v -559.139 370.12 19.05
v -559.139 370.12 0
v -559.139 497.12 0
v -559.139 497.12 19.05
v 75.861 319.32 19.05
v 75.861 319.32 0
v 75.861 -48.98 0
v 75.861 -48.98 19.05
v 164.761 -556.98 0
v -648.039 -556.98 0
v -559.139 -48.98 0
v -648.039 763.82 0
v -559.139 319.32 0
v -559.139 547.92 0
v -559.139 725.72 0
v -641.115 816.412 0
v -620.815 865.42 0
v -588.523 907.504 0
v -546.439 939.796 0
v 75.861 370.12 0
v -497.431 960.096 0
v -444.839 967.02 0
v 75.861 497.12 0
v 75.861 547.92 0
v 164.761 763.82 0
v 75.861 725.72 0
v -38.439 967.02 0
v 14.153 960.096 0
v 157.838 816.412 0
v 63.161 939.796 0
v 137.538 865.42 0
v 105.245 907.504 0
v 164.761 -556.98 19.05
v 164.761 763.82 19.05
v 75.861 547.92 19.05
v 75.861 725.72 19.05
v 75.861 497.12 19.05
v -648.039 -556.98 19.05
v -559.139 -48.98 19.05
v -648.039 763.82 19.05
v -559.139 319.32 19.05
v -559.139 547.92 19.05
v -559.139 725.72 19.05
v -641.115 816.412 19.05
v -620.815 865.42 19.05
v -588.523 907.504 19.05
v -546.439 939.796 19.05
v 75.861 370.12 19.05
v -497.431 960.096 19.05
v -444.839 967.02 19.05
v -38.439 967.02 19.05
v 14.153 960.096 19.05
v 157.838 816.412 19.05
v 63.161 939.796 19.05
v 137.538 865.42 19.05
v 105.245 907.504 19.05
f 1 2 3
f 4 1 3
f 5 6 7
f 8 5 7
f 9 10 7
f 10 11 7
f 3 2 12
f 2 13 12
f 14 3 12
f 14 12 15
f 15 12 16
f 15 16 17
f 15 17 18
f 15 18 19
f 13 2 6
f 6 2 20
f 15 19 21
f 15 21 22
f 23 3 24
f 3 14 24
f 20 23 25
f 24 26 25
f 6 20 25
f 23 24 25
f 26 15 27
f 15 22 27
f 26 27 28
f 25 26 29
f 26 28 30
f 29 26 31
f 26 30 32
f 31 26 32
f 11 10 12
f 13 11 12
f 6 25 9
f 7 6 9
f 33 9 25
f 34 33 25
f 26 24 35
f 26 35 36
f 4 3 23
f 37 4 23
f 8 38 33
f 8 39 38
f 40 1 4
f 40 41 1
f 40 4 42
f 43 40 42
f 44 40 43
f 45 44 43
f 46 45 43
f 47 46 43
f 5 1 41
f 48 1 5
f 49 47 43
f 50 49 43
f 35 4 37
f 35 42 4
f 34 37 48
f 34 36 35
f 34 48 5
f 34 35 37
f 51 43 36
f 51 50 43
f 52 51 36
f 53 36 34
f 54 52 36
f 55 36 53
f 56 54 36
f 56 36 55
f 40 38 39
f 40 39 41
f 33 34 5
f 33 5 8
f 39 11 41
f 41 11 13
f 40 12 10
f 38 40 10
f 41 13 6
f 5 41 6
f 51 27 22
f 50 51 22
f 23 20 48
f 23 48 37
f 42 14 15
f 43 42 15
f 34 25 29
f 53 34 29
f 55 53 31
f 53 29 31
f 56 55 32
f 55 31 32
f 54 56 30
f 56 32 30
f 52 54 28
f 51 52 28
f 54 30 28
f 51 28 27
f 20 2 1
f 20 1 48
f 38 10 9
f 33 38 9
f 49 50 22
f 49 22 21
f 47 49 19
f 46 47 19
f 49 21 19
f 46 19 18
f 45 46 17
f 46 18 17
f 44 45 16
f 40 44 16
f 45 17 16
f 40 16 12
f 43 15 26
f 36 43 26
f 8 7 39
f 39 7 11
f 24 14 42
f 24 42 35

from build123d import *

# Parameters (mm, degrees)
F0_W     = 635
F0_H     = 126.999991
F0_H_2   = 177.800009
F1_DEPTH = 19.05


with BuildPart() as f1:
    # F0 (on Top) → F1 (new body)
    with BuildSketch(Plane.XY):
        with BuildLine():
            Line((-648.038619, 763.81958), (-648.038619, -556.98042))
            Line((-648.038619, -556.98042), (164.761381, -556.98042))
            Line((164.761381, -556.98042), (164.761381, 763.81958))
            ThreePointArc((164.761381, 763.81958), (105.245479, 907.503678), (-38.438619, 967.01958))
            Line((-38.438619, 967.01958), (-444.838619, 967.01958))
            ThreePointArc((-444.838619, 967.01958), (-588.522717, 907.503678), (-648.038619, 763.81958))
        make_face()
        Polygon((75.861381, -48.98042), (-559.138619, -48.98042), (-559.138619, 90.71958), (-559.138619, 141.51958), (-559.138619, 319.31958), (75.861381, 319.31958), (75.861381, 141.51958), (75.861381, 90.71958), align=None, mode=Mode.SUBTRACT)
        with Locations((-241.638619, 433.619575)):
            Rectangle(F0_W, F0_H, mode=Mode.SUBTRACT)
        with Locations((-241.638619, 636.819575)):
            Rectangle(F0_W, F0_H_2, mode=Mode.SUBTRACT)
    extrude(amount=F1_DEPTH)


solid = f1.part
